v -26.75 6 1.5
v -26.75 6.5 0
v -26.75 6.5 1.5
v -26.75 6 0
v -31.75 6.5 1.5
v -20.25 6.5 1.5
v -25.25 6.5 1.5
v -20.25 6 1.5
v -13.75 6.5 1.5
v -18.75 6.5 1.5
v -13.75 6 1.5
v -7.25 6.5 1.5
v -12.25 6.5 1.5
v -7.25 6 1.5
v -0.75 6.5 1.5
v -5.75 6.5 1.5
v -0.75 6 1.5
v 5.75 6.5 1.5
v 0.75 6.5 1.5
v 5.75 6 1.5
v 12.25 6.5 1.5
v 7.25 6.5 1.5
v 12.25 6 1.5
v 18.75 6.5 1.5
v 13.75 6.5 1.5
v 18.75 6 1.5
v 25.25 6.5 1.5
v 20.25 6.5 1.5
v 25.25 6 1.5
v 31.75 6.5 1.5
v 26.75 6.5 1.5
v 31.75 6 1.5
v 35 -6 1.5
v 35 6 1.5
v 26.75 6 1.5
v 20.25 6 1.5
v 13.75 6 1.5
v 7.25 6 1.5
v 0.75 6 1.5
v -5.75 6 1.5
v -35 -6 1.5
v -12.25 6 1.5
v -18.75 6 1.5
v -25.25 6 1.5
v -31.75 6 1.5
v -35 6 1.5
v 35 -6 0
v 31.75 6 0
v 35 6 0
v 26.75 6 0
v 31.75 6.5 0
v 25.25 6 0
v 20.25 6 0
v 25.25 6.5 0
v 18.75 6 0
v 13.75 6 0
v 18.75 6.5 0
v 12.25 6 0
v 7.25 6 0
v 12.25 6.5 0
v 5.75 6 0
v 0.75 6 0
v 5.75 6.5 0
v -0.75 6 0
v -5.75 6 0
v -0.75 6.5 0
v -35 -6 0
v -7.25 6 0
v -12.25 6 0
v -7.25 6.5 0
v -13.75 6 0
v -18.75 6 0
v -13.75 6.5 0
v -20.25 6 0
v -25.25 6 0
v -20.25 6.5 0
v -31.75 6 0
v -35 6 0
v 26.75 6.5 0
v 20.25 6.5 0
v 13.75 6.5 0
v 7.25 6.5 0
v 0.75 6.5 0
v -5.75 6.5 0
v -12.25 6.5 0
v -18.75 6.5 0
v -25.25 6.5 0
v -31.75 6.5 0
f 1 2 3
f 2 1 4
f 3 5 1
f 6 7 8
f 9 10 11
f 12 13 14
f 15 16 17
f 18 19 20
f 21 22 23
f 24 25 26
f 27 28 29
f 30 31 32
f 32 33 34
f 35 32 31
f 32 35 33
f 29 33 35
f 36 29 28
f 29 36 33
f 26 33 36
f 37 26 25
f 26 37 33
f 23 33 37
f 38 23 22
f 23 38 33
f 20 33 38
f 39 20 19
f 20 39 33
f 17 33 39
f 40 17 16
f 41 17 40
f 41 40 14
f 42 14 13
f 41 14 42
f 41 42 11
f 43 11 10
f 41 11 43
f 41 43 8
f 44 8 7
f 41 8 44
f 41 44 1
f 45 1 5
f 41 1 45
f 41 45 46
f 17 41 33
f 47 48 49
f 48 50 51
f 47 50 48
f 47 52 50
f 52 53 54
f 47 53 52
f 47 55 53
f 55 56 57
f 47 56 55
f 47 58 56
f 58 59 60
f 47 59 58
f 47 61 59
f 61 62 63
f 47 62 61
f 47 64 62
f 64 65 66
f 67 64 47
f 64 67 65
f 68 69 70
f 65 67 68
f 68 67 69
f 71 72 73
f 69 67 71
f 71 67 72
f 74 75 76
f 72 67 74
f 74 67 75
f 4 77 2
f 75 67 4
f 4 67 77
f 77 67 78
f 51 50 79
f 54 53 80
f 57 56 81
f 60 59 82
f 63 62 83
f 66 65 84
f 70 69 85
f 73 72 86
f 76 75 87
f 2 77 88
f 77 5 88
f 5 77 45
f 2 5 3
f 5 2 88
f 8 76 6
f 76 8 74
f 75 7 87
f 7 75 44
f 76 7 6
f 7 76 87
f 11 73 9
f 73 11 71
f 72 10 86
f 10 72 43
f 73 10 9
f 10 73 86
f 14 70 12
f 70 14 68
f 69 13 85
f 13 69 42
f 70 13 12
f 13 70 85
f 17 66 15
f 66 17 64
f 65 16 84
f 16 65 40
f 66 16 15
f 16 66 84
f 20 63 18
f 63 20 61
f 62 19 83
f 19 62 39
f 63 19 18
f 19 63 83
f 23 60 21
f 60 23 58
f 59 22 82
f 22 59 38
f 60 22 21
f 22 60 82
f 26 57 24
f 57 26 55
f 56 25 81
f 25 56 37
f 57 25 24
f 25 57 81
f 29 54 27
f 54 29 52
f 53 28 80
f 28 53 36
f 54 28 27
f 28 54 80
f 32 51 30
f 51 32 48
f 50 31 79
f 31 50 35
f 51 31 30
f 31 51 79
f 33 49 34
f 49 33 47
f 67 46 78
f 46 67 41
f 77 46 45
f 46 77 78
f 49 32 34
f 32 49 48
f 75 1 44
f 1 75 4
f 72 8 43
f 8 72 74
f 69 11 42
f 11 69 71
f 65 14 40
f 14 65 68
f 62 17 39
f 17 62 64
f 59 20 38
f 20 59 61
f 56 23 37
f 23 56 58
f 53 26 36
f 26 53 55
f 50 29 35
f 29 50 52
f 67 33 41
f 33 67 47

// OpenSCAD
// 10-well comb for agarose gel casting
// Print orientation: flat on bed, teeth pointing down (-Z)

$fn = 64;

// ---- Dimensions (mm) ----
plate_t      = 1.5;    // plate thickness (Z)
spine_len    = 70;     // spine length (X)
spine_w      = 12;     // spine width (Y)
tooth_w      = 5.0;    // tooth width (X)
tooth_len    = 12;     // tooth length (Y)
tooth_count  = 10;     // number of teeth
gap          = 1.5;    // gap between teeth (X)
embed        = 0.5;    // tooth overlap into plate for a clean pour

// Derived
pitch   = tooth_w + gap;
x0      = -(tooth_count - 1) * pitch / 2;   // first tooth centre (X)
y0      = -spine_w / 2 + embed;             // plate top face (Y offset)

// ---- Model ----
union() {
    // Spine (back bar)
    translate([-spine_len / 2, -spine_w / 2, 0])
        cube([spine_len, spine_w, plate_t]);

    // Teeth
    for (i = [0 : tooth_count - 1])
        translate([x0 + i * pitch - tooth_w / 2, y0, 0])
            cube([tooth_w, tooth_len, plate_t]);
}
